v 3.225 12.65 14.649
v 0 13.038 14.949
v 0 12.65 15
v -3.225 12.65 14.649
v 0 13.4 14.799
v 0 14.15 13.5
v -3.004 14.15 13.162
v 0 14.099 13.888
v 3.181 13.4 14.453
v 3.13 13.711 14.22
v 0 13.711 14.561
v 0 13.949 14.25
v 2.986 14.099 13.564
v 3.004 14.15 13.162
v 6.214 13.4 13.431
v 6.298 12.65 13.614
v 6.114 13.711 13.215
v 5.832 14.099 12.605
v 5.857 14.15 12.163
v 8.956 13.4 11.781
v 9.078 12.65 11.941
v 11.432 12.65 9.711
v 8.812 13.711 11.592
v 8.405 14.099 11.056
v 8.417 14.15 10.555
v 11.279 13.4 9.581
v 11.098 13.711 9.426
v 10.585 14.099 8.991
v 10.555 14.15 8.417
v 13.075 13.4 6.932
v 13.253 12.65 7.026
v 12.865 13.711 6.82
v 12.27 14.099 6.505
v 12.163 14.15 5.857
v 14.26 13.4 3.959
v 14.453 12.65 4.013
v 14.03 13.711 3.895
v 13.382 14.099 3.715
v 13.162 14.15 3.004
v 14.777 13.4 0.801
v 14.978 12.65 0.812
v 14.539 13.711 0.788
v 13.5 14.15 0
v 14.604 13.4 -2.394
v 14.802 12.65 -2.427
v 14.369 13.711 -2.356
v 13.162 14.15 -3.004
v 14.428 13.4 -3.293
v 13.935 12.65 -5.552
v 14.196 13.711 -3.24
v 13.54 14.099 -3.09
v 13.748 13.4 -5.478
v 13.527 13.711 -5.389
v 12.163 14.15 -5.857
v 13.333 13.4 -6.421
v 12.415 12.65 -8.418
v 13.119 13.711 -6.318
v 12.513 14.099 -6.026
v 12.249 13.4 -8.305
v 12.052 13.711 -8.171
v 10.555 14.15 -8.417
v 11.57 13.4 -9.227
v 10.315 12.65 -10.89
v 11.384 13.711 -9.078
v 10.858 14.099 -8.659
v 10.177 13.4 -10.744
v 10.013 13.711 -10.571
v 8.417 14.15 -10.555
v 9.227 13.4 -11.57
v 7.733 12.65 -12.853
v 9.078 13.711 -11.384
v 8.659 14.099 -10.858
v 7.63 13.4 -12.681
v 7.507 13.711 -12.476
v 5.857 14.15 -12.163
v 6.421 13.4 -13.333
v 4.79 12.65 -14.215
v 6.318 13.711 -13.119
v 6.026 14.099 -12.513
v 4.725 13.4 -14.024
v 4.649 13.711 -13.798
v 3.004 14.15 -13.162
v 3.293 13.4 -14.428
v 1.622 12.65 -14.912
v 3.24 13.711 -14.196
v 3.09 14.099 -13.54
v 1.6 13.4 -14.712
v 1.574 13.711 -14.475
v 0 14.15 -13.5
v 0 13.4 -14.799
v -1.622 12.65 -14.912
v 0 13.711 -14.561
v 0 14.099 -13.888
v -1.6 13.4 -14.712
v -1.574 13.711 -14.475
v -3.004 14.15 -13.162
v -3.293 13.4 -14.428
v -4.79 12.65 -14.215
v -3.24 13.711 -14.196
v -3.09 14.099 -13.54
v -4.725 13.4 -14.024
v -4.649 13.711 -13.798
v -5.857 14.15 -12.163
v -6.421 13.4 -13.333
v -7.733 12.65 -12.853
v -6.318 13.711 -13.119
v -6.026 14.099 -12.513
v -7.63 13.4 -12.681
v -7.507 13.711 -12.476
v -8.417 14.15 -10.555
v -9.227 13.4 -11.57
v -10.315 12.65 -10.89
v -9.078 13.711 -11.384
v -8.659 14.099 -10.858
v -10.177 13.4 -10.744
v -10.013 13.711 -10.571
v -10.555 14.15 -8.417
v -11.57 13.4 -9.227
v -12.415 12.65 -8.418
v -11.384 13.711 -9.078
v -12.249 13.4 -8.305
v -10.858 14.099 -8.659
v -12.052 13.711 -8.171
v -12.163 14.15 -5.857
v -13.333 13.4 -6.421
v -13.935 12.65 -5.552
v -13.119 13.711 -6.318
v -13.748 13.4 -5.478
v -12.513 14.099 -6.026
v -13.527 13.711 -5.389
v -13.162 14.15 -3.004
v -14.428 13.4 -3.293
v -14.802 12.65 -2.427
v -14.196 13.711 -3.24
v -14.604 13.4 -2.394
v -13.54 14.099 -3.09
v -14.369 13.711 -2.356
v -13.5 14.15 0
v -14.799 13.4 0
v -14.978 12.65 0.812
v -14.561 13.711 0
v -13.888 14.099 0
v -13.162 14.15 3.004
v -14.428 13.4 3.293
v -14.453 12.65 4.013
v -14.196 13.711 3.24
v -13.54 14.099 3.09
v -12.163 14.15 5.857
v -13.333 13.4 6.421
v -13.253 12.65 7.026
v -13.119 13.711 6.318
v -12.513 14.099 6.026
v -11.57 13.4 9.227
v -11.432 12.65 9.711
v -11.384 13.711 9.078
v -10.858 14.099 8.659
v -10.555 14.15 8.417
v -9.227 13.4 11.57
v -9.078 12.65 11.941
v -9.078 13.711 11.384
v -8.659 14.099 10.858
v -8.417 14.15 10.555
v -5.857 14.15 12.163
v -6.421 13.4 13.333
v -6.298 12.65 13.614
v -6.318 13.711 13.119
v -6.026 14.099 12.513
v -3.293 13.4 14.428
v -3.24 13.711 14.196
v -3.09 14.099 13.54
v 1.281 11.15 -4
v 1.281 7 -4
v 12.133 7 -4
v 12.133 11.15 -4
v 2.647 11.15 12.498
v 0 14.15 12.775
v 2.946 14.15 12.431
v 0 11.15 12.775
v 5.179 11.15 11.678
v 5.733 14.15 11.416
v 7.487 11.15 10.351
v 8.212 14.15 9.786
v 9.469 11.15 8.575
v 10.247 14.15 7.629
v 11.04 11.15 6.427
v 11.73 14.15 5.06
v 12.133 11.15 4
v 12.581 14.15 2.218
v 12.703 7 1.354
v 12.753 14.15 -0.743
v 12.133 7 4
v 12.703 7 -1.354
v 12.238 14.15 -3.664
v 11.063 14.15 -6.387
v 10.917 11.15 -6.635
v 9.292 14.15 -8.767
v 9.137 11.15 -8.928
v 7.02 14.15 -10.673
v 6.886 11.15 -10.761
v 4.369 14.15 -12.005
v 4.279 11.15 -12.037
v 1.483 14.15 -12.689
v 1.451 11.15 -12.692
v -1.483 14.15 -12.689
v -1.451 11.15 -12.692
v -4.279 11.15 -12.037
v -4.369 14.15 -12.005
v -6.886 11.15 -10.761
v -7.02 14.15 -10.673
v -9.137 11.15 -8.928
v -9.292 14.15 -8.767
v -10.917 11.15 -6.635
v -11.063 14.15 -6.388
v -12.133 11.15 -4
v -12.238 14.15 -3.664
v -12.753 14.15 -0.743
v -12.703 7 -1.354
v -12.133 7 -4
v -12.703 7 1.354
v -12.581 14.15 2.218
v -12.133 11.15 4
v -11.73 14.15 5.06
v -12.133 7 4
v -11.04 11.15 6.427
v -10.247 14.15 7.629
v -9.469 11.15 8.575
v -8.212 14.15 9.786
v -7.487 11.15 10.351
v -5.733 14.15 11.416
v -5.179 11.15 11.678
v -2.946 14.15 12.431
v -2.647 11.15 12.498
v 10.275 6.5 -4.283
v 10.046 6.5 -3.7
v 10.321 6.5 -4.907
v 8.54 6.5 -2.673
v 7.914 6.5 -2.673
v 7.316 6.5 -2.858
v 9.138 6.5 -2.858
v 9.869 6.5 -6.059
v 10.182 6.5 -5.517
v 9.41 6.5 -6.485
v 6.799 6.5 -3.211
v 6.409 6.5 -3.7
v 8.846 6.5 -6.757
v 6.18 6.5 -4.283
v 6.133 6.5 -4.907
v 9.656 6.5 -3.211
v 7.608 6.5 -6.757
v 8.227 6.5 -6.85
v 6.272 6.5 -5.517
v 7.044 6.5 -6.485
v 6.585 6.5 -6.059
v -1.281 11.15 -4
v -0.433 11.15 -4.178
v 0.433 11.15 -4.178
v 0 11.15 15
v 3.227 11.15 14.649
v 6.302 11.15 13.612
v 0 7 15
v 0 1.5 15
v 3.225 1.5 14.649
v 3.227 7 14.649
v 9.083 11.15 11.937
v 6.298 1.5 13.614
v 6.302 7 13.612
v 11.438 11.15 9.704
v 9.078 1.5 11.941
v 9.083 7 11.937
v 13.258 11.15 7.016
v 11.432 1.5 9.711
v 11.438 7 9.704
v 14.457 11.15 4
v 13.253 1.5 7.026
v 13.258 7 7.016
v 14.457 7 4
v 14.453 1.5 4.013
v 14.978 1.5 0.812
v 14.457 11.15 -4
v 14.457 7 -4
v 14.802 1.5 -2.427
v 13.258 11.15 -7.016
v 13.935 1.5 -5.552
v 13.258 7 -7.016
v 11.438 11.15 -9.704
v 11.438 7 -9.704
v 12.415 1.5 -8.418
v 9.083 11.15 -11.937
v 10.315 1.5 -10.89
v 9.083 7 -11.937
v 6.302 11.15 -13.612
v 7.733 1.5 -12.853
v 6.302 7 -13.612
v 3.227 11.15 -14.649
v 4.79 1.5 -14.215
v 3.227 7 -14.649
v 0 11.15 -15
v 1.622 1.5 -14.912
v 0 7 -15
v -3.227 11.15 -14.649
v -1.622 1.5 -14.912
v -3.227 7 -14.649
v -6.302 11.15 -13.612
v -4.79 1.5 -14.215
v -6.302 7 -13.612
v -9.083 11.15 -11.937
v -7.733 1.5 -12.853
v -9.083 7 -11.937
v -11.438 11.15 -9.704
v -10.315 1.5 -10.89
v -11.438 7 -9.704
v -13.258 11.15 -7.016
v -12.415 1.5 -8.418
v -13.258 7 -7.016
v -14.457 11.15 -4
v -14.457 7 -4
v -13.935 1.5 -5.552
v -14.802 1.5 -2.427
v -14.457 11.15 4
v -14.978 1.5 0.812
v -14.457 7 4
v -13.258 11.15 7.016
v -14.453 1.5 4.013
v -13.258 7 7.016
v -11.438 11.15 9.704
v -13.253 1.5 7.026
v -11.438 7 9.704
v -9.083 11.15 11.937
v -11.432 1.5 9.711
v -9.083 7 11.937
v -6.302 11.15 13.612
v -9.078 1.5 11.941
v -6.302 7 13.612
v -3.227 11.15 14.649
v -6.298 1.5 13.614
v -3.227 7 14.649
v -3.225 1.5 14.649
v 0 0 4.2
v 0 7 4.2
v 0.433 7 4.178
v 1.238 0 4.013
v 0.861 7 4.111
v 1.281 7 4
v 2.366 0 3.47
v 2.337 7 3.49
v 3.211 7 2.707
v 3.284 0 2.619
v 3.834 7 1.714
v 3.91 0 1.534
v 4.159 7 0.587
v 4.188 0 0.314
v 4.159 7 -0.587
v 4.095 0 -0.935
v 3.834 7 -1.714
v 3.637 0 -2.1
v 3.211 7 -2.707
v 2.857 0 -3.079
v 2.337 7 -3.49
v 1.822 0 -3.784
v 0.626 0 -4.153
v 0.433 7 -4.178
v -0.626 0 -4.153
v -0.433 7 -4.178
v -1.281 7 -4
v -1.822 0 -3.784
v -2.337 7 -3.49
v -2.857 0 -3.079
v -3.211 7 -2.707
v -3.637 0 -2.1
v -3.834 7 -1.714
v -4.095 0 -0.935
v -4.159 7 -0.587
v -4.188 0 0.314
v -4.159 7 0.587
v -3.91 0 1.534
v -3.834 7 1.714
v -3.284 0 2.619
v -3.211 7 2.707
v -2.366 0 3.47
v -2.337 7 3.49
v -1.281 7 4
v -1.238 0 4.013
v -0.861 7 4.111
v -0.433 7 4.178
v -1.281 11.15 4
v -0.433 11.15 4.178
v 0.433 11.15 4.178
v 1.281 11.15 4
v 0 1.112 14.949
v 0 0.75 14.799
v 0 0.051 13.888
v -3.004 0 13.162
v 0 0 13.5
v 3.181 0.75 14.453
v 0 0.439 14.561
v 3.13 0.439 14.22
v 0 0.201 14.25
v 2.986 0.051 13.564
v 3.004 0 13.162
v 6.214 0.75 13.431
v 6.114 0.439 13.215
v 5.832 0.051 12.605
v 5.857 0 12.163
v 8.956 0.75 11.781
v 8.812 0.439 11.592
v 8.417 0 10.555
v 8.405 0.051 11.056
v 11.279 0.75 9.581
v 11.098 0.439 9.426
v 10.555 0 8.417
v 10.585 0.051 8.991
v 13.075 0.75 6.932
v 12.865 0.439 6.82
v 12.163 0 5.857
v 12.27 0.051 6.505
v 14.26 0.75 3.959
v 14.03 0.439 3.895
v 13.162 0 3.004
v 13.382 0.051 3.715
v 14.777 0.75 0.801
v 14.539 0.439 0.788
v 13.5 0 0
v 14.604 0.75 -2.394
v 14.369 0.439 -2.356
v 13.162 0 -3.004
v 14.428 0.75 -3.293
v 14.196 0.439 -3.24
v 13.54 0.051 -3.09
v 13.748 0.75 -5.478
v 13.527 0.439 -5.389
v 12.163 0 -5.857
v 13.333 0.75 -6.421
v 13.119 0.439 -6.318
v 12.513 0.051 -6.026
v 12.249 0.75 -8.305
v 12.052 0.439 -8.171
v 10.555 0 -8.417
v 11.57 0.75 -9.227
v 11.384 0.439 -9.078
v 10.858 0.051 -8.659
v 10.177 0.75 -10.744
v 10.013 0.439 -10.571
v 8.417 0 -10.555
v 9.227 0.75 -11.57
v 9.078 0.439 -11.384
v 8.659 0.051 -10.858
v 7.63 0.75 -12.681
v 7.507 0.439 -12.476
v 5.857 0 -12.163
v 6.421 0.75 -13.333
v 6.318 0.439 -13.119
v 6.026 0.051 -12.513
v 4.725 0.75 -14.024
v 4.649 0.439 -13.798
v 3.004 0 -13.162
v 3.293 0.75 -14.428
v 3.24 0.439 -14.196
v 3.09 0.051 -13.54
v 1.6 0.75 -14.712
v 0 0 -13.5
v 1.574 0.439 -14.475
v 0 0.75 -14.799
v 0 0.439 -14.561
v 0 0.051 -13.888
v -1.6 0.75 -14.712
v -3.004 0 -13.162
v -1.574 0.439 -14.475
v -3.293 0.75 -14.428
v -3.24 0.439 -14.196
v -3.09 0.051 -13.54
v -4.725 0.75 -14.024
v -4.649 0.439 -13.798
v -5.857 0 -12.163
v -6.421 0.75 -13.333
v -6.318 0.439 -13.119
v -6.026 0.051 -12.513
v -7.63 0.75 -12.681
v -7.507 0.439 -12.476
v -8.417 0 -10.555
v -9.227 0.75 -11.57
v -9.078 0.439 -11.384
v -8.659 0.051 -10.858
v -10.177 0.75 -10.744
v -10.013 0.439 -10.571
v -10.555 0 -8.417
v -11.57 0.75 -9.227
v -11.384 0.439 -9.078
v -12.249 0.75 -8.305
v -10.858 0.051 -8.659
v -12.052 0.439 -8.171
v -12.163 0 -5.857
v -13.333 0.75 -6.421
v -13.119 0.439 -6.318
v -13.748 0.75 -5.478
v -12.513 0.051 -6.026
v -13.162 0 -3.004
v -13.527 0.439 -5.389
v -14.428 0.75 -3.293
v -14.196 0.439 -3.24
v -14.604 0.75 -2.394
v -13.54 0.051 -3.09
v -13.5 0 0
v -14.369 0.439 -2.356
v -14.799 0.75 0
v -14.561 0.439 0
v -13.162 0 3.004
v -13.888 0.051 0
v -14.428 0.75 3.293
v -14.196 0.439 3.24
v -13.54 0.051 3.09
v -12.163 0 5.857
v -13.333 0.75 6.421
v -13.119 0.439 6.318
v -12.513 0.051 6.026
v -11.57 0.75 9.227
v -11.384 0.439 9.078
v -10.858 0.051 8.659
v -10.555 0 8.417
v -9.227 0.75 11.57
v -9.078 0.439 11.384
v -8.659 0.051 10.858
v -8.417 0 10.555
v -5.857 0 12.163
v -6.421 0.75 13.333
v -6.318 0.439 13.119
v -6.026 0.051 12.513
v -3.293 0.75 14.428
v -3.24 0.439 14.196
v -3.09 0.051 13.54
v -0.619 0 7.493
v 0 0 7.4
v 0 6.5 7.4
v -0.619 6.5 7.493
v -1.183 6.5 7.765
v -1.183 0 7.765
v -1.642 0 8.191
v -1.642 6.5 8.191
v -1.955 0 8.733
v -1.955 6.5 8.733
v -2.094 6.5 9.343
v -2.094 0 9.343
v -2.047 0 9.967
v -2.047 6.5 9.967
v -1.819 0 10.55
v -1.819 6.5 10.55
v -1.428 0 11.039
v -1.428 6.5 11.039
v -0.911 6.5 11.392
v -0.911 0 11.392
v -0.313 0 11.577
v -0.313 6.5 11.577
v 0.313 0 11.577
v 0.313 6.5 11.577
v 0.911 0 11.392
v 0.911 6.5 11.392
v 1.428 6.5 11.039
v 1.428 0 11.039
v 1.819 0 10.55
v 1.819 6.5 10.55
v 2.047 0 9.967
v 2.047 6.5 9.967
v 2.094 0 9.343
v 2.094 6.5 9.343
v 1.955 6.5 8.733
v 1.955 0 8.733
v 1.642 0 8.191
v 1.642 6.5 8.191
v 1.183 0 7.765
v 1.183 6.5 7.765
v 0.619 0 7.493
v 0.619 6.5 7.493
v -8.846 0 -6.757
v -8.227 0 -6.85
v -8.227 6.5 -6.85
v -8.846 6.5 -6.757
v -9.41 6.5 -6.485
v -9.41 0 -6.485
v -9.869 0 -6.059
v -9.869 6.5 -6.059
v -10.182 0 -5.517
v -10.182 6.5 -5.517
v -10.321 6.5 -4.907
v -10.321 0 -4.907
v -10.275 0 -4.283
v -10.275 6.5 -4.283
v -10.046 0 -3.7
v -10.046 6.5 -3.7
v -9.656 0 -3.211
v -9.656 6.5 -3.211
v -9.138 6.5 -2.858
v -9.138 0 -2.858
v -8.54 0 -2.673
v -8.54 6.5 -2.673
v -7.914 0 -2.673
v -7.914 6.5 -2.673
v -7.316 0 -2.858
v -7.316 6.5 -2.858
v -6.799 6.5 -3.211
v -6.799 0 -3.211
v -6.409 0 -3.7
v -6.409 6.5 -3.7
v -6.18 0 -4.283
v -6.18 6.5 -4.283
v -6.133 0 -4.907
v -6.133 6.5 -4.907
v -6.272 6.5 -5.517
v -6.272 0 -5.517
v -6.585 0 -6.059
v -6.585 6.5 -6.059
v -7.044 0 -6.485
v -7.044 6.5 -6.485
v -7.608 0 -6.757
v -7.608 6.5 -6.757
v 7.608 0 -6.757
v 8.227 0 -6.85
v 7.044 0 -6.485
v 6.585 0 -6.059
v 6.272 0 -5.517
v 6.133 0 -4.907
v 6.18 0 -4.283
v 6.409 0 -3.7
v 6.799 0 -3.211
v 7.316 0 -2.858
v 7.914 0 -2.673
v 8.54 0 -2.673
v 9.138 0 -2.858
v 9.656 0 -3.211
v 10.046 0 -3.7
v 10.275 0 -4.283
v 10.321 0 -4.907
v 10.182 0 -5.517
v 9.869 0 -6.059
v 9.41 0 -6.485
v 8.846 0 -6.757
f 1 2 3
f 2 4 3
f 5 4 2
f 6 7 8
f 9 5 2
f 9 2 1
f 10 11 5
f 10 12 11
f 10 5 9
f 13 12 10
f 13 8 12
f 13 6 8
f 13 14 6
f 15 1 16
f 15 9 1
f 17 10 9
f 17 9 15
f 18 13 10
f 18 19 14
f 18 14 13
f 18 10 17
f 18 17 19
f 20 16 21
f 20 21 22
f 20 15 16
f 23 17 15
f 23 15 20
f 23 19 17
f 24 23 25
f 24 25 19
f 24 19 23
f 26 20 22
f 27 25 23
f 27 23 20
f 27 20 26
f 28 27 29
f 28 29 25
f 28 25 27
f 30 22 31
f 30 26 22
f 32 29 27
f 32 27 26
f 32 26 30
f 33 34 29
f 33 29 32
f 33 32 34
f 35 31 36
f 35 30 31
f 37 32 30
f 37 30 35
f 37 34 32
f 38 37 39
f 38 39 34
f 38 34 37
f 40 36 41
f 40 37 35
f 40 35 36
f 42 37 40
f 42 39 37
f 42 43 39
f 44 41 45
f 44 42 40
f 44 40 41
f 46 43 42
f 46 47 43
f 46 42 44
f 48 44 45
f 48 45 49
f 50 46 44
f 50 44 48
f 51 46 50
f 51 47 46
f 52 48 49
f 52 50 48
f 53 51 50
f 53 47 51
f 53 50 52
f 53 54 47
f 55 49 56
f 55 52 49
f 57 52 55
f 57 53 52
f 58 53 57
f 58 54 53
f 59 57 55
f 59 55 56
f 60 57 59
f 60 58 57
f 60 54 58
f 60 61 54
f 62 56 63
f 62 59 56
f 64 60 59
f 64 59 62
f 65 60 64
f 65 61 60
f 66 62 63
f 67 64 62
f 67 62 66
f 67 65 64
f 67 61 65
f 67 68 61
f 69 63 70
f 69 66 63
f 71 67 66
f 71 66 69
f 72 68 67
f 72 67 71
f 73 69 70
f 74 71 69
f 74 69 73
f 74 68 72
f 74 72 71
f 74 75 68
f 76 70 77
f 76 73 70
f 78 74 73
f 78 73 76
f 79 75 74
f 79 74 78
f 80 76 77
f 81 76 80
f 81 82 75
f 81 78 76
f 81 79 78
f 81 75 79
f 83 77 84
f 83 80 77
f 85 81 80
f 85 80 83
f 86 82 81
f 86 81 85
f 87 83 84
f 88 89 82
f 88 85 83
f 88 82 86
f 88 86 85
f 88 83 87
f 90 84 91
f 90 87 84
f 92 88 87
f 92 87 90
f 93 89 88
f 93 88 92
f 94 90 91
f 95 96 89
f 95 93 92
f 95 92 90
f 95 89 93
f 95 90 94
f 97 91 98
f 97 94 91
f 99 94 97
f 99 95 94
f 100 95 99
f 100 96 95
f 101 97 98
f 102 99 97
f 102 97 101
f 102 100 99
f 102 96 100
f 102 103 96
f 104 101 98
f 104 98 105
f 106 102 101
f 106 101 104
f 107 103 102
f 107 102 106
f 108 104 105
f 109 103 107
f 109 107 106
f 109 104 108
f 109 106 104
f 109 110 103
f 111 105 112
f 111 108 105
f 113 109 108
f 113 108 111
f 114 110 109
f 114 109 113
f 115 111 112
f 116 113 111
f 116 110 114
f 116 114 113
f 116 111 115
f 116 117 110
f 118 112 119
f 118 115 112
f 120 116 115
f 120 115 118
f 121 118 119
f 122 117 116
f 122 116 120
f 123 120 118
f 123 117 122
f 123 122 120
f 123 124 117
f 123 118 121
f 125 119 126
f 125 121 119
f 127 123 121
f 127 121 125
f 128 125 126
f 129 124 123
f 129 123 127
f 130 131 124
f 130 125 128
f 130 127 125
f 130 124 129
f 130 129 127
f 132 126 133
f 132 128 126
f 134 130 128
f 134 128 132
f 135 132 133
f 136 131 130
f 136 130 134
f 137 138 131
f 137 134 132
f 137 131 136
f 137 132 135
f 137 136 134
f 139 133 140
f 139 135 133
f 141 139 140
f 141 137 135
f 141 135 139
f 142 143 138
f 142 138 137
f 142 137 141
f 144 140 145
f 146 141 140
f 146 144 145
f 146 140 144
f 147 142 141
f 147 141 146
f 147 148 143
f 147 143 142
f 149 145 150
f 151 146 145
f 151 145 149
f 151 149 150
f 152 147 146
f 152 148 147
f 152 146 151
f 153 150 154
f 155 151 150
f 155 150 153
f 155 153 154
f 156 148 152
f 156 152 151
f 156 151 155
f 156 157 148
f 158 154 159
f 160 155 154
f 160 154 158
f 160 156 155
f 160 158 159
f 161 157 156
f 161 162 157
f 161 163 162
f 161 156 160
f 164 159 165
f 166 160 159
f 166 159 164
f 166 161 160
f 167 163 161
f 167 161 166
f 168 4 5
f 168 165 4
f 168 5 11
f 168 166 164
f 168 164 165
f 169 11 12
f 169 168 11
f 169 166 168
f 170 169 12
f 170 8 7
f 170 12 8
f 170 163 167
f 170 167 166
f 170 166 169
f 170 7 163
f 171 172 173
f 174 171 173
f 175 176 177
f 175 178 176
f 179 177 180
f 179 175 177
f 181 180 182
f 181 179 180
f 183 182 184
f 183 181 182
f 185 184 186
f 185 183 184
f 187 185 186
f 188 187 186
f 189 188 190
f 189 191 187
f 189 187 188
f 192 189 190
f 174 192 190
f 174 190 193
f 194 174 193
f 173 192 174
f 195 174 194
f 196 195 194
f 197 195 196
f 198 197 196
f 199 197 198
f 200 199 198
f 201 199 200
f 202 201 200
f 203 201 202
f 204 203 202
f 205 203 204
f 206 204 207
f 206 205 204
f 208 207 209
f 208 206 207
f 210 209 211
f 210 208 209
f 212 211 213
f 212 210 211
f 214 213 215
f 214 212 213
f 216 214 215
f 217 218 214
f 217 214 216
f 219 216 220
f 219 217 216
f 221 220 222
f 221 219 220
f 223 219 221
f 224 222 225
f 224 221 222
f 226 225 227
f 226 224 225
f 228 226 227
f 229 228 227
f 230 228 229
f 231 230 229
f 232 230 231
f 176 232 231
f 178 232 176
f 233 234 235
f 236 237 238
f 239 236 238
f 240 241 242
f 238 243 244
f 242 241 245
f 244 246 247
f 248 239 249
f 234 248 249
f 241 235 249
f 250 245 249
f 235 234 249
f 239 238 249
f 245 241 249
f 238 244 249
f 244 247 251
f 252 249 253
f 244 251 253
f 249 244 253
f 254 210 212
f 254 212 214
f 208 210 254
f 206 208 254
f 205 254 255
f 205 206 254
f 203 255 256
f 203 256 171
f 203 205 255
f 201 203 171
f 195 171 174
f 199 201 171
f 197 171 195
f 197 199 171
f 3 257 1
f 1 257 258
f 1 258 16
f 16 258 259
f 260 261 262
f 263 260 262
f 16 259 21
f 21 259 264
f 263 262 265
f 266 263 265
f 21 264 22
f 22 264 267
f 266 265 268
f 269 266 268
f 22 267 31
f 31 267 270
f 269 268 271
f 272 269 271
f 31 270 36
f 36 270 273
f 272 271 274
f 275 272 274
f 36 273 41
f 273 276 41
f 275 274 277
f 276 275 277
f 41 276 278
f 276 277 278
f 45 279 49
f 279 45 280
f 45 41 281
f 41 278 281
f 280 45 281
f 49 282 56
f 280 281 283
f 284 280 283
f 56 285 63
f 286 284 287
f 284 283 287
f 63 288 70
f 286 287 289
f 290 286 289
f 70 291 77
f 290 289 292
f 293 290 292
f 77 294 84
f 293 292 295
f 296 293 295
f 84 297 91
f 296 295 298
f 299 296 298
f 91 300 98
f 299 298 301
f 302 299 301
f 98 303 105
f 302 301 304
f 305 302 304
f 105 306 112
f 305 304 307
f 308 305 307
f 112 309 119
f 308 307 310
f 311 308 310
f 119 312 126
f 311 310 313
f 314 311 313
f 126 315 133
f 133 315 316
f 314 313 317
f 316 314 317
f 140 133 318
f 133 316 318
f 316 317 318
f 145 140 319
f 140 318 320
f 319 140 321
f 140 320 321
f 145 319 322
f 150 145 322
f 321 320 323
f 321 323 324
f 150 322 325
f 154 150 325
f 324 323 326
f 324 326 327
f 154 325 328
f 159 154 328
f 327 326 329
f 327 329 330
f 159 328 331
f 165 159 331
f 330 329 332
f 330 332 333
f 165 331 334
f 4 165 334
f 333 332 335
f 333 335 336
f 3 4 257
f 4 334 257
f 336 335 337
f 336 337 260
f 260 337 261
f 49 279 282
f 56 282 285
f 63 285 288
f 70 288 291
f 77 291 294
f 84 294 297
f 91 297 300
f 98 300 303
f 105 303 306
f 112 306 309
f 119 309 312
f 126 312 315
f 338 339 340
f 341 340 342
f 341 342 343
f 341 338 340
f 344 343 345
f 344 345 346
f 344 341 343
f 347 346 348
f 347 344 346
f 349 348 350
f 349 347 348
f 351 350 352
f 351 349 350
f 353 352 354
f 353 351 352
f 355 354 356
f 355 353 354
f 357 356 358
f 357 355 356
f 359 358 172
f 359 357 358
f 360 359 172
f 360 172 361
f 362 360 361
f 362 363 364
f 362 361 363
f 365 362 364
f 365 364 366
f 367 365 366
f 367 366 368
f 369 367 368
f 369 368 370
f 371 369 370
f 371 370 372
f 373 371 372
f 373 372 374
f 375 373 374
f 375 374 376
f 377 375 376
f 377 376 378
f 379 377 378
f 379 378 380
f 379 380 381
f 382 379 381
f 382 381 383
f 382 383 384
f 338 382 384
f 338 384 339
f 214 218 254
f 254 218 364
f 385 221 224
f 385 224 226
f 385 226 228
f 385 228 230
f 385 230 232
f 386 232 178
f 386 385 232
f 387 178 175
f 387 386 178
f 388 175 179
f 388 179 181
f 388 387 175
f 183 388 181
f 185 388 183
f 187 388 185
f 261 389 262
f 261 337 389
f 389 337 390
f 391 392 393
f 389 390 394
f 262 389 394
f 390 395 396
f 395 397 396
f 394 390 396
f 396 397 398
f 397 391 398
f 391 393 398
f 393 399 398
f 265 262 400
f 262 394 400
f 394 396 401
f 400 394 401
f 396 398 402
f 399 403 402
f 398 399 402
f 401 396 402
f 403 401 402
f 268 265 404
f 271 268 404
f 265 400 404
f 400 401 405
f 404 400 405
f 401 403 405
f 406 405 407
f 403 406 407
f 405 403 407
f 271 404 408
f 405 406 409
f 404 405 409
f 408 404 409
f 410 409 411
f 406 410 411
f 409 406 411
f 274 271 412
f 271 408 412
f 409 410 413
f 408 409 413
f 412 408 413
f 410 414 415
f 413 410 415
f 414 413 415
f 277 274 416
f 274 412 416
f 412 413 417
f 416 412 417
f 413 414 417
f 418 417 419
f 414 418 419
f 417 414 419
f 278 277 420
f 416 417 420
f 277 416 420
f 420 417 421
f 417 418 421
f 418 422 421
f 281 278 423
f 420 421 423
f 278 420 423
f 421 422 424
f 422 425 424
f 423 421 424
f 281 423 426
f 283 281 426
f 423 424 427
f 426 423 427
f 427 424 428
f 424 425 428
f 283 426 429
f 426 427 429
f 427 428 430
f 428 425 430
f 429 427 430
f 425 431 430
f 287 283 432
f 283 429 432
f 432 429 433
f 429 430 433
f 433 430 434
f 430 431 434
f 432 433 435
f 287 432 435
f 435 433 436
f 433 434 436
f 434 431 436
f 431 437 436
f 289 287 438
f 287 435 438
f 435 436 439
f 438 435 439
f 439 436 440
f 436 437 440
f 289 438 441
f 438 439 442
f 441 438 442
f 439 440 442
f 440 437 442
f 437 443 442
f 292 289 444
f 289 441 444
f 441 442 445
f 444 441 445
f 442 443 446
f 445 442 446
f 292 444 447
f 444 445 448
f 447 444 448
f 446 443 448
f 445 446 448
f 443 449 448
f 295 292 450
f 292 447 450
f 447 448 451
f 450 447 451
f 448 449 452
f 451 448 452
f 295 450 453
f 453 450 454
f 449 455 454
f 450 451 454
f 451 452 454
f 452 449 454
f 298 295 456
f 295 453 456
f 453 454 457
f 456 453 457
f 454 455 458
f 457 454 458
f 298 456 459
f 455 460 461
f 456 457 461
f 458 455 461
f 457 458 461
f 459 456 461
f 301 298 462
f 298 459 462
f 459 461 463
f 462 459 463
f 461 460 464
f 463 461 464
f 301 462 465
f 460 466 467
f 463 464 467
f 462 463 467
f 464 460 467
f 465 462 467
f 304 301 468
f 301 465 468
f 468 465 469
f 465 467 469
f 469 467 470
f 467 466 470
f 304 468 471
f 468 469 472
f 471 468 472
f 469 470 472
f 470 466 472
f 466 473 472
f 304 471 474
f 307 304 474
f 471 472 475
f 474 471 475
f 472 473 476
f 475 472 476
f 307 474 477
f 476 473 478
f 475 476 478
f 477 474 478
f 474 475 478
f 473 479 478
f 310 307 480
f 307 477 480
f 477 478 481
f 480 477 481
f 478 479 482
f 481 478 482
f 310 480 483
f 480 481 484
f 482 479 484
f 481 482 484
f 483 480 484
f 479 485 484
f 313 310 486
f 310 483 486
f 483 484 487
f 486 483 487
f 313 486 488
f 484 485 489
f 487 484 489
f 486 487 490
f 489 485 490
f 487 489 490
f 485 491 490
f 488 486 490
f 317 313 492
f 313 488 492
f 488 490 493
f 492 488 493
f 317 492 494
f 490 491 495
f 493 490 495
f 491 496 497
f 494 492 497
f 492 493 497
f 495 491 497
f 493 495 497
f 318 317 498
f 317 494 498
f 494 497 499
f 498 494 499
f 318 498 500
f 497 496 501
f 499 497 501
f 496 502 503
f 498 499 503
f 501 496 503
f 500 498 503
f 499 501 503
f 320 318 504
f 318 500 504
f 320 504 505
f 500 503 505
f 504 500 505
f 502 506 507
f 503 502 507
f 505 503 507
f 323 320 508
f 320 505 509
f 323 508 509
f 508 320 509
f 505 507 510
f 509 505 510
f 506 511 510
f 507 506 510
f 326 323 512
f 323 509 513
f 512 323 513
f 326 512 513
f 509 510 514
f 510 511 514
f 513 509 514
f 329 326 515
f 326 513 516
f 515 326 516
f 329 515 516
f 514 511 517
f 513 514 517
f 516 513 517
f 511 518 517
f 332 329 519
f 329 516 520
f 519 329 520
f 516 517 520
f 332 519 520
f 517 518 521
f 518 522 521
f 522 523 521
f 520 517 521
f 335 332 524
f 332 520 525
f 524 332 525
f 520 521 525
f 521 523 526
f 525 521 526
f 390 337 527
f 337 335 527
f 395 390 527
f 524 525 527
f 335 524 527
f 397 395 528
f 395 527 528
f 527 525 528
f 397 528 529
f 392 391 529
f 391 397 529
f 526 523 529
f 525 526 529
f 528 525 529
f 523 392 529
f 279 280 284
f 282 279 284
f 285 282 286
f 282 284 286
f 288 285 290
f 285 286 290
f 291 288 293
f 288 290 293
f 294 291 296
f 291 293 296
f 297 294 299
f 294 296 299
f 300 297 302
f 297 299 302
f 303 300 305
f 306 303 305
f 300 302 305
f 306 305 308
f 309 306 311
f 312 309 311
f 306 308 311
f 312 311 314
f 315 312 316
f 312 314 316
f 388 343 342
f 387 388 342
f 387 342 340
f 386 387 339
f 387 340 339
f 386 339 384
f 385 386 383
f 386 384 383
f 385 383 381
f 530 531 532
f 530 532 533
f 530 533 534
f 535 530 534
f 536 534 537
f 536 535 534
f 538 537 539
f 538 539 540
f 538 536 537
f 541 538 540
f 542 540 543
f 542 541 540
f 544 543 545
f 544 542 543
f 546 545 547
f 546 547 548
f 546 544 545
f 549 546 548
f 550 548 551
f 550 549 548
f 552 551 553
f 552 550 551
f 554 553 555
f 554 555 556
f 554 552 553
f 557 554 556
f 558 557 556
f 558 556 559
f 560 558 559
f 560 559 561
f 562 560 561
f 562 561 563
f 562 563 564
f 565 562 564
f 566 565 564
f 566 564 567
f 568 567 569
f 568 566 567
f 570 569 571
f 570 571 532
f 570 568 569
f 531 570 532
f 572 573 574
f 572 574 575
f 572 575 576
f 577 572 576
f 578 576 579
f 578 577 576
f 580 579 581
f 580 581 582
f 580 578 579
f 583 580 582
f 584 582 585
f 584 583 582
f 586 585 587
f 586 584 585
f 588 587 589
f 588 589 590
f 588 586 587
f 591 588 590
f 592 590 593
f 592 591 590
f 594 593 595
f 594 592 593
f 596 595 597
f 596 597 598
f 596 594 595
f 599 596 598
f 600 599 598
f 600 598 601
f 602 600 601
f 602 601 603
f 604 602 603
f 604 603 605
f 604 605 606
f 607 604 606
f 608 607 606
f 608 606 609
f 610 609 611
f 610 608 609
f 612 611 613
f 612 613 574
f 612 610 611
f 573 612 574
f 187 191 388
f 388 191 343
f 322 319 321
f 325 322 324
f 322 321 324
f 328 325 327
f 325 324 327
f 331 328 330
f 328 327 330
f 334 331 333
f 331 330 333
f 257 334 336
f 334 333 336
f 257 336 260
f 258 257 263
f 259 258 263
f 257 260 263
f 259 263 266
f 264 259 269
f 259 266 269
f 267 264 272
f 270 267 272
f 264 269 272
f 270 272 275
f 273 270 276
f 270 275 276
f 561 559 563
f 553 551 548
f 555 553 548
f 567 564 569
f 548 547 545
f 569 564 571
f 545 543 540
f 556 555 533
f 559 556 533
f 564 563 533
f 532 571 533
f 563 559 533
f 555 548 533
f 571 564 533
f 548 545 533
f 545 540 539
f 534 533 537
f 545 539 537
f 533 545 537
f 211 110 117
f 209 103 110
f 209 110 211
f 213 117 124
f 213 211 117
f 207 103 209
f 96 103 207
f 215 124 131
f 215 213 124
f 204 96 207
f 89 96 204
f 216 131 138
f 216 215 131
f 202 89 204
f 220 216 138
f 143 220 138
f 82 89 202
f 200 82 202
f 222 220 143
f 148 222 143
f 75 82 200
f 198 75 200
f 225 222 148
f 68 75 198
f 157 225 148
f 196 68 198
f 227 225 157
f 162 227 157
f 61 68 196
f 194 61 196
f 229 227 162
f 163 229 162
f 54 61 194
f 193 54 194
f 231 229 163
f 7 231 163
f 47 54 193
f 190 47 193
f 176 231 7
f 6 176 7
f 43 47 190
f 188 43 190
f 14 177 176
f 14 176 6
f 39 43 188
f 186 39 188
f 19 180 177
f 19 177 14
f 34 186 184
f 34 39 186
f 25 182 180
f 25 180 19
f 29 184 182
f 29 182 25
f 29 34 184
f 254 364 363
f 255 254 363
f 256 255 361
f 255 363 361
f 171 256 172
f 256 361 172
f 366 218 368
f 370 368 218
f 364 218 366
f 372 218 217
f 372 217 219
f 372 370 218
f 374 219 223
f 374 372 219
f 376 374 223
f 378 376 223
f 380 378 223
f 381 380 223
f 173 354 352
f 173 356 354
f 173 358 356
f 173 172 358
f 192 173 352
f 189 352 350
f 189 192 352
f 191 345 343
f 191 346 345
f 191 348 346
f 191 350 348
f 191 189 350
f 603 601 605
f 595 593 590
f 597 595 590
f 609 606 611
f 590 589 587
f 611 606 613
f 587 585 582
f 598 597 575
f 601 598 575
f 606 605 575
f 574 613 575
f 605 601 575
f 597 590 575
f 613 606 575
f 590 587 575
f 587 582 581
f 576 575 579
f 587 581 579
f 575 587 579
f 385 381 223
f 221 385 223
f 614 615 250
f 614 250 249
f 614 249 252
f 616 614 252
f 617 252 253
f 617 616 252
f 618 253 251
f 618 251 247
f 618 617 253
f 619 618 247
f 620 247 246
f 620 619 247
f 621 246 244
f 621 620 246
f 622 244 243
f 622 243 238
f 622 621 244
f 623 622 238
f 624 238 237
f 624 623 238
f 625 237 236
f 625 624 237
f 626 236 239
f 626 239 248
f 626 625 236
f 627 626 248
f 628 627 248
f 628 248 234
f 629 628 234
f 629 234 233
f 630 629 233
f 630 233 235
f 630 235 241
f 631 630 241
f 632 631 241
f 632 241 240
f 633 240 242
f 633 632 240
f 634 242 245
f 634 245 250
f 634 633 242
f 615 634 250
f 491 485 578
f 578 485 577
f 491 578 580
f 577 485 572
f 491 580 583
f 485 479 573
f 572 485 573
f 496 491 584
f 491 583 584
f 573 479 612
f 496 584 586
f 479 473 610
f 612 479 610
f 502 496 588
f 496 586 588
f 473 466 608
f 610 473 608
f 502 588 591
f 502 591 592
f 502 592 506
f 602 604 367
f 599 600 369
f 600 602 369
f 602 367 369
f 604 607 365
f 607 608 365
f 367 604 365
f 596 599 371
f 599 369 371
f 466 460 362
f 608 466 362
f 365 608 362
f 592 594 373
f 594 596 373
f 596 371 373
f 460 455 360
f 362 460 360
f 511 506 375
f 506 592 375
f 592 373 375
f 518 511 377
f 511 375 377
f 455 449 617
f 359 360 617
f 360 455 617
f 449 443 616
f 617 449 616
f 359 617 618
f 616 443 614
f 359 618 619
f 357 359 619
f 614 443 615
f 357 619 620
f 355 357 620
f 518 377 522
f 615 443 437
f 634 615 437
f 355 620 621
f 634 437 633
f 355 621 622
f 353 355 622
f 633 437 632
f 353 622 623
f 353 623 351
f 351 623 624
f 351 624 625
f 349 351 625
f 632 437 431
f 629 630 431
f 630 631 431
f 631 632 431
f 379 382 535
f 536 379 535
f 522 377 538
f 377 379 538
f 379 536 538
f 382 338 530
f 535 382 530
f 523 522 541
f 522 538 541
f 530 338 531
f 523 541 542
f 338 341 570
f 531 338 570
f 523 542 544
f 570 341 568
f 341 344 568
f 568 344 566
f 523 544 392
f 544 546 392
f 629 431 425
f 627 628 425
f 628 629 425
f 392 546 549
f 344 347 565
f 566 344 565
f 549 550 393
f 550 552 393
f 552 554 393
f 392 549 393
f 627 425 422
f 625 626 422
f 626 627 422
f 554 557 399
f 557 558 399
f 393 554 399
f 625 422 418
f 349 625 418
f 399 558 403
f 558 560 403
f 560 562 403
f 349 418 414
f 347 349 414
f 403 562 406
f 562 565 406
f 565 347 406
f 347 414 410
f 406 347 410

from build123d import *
from build123d.topology import SkipClean

# Parameters (mm, degrees)
SKETCH1_R                       = 15
BOSS_EXTRUDE1_DEPTH             = 7
SKETCH2_R                       = 4.2
CUT_EXTRUDE1_DEPTH              = 7
BOSS_EXTRUDE2_DEPTH             = 4.15
SKETCH1_5_R                     = 2.1
CUT_EXTRUDE2_DEPTH              = 6.5
SKETCH6_R                       = 15
SKETCH6_R_2                     = 12.775
BOSS_EXTRUDE3_DEPTH             = 3
BOSS_EXTRUDE3_DIRECTION_2_REACH = 25.965
FILLET1_R                       = 1.5


with BuildPart() as part:
    # Sketch1 → Boss-Extrude1 (new body)
    with BuildSketch(Plane(origin=(0, 0, 0), x_dir=(1, 0, 0), z_dir=(0, 1, 0))):
        with Locations(Location((0, 0, 0), (0, 0, 270))):
            Circle(SKETCH1_R)
    extrude(amount=BOSS_EXTRUDE1_DEPTH)

    # Sketch2 → Cut-Extrude1 (cut)
    with BuildSketch(Plane(origin=(0, 0, 0), x_dir=(1, 0, 0), z_dir=(0, 1, 0))):
        with Locations(Location((0, 0, 0), (0, 0, 270))):
            Circle(SKETCH2_R)
    extrude(amount=CUT_EXTRUDE1_DEPTH, mode=Mode.SUBTRACT)

    # Sketch5 → Boss-Extrude2 (add)
    with SkipClean():  # the faces are left unmerged after this step: merging them gives an invalid solid
        with BuildSketch(Plane(origin=(0, 7, 0), x_dir=(1, 0, 0), z_dir=(0, 1, 0))):
            with BuildLine():
                ThreePointArc((14.456832, 4), (0, 15), (-14.456832, 4))
                Line((-14.456832, 4), (-1.280625, 4))
                ThreePointArc((-1.280625, 4), (0, 4.2), (1.280625, 4))
                Line((1.280625, 4), (14.456832, 4))
            make_face()
            with BuildLine():
                Line((-1.280625, -4), (-14.456832, -4))
                ThreePointArc((-14.456832, -4), (0, -15), (14.456832, -4))
                Line((14.456832, -4), (1.280625, -4))
                ThreePointArc((1.280625, -4), (0, -4.2), (-1.280625, -4))
            make_face()
        extrude(amount=BOSS_EXTRUDE2_DEPTH)

    # Sketch1<5> → Cut-Extrude2 (cut)
    with SkipClean():  # the faces are left unmerged after this step: merging them gives an invalid solid
        with BuildSketch(Plane(origin=(0, 0, 0), x_dir=(1, 0, 0), z_dir=(0, 1, 0))):
            with Locations(Location((0, -9.5, 0), (0, 0, 90))):
                Circle(SKETCH1_5_R)
            with Locations(Location((-8.227241, 4.75, 0), (0, 0, 90))):
                Circle(SKETCH1_5_R)
            with Locations(Location((8.227241, 4.75, 0), (0, 0, 90))):
                Circle(SKETCH1_5_R)
        extrude(amount=CUT_EXTRUDE2_DEPTH, mode=Mode.SUBTRACT)

    # Sketch6 → Boss-Extrude3 (add)
    with SkipClean():  # the faces are left unmerged after this step: merging them gives an invalid solid
        with BuildSketch(Plane(origin=(0, 11.15, 0), x_dir=(1, 0, 0), z_dir=(0, 1, 0))):
            with Locations(Location((0, 0, 0), (0, 0, 270))):
                Circle(SKETCH6_R)
            with Locations(Location((0, 0, 0), (0, 0, 270))):
                Circle(SKETCH6_R_2, mode=Mode.SUBTRACT)
        extrude(amount=BOSS_EXTRUDE3_DEPTH)

    # Boss-Extrude3 direction 2: up to this face of the body (flat: up to its plane)
    boss_extrude3_direction_2_end = Plane(part.part.faces().sort_by_distance((-9.095084, 7, 0))[0])
    # Sketch6 → Boss-Extrude3 direction 2 (add, up to the picked face)
    with BuildSketch(Plane(origin=(0, 11.15, 0), x_dir=(1, 0, 0), z_dir=(0, 1, 0)), mode=Mode.PRIVATE) as boss_extrude3_direction_2_sk1:
        with Locations(Location((0, 0, 0), (0, 0, 270))):
            Circle(SKETCH6_R)
        with Locations(Location((0, 0, 0), (0, 0, 270))):
            Circle(SKETCH6_R_2, mode=Mode.SUBTRACT)
    boss_extrude3_direction_2_tool1 = split(extrude(boss_extrude3_direction_2_sk1.sketch, amount=-BOSS_EXTRUDE3_DIRECTION_2_REACH, mode=Mode.PRIVATE), bisect_by=boss_extrude3_direction_2_end, keep=Keep.BOTH, mode=Mode.PRIVATE)
    add(boss_extrude3_direction_2_tool1.solids().sort_by(Axis((0, 11.15, -14.575736), (0, -1, 0)))[0])

    # Fillet1
    fillet1_edges = [part.edges().sort_by_distance(p)[0] for p in [
        (0, 0, -15),
        (0, 14.15, -15),
    ]]
    fillet(fillet1_edges, radius=FILLET1_R)


solid = part.part
